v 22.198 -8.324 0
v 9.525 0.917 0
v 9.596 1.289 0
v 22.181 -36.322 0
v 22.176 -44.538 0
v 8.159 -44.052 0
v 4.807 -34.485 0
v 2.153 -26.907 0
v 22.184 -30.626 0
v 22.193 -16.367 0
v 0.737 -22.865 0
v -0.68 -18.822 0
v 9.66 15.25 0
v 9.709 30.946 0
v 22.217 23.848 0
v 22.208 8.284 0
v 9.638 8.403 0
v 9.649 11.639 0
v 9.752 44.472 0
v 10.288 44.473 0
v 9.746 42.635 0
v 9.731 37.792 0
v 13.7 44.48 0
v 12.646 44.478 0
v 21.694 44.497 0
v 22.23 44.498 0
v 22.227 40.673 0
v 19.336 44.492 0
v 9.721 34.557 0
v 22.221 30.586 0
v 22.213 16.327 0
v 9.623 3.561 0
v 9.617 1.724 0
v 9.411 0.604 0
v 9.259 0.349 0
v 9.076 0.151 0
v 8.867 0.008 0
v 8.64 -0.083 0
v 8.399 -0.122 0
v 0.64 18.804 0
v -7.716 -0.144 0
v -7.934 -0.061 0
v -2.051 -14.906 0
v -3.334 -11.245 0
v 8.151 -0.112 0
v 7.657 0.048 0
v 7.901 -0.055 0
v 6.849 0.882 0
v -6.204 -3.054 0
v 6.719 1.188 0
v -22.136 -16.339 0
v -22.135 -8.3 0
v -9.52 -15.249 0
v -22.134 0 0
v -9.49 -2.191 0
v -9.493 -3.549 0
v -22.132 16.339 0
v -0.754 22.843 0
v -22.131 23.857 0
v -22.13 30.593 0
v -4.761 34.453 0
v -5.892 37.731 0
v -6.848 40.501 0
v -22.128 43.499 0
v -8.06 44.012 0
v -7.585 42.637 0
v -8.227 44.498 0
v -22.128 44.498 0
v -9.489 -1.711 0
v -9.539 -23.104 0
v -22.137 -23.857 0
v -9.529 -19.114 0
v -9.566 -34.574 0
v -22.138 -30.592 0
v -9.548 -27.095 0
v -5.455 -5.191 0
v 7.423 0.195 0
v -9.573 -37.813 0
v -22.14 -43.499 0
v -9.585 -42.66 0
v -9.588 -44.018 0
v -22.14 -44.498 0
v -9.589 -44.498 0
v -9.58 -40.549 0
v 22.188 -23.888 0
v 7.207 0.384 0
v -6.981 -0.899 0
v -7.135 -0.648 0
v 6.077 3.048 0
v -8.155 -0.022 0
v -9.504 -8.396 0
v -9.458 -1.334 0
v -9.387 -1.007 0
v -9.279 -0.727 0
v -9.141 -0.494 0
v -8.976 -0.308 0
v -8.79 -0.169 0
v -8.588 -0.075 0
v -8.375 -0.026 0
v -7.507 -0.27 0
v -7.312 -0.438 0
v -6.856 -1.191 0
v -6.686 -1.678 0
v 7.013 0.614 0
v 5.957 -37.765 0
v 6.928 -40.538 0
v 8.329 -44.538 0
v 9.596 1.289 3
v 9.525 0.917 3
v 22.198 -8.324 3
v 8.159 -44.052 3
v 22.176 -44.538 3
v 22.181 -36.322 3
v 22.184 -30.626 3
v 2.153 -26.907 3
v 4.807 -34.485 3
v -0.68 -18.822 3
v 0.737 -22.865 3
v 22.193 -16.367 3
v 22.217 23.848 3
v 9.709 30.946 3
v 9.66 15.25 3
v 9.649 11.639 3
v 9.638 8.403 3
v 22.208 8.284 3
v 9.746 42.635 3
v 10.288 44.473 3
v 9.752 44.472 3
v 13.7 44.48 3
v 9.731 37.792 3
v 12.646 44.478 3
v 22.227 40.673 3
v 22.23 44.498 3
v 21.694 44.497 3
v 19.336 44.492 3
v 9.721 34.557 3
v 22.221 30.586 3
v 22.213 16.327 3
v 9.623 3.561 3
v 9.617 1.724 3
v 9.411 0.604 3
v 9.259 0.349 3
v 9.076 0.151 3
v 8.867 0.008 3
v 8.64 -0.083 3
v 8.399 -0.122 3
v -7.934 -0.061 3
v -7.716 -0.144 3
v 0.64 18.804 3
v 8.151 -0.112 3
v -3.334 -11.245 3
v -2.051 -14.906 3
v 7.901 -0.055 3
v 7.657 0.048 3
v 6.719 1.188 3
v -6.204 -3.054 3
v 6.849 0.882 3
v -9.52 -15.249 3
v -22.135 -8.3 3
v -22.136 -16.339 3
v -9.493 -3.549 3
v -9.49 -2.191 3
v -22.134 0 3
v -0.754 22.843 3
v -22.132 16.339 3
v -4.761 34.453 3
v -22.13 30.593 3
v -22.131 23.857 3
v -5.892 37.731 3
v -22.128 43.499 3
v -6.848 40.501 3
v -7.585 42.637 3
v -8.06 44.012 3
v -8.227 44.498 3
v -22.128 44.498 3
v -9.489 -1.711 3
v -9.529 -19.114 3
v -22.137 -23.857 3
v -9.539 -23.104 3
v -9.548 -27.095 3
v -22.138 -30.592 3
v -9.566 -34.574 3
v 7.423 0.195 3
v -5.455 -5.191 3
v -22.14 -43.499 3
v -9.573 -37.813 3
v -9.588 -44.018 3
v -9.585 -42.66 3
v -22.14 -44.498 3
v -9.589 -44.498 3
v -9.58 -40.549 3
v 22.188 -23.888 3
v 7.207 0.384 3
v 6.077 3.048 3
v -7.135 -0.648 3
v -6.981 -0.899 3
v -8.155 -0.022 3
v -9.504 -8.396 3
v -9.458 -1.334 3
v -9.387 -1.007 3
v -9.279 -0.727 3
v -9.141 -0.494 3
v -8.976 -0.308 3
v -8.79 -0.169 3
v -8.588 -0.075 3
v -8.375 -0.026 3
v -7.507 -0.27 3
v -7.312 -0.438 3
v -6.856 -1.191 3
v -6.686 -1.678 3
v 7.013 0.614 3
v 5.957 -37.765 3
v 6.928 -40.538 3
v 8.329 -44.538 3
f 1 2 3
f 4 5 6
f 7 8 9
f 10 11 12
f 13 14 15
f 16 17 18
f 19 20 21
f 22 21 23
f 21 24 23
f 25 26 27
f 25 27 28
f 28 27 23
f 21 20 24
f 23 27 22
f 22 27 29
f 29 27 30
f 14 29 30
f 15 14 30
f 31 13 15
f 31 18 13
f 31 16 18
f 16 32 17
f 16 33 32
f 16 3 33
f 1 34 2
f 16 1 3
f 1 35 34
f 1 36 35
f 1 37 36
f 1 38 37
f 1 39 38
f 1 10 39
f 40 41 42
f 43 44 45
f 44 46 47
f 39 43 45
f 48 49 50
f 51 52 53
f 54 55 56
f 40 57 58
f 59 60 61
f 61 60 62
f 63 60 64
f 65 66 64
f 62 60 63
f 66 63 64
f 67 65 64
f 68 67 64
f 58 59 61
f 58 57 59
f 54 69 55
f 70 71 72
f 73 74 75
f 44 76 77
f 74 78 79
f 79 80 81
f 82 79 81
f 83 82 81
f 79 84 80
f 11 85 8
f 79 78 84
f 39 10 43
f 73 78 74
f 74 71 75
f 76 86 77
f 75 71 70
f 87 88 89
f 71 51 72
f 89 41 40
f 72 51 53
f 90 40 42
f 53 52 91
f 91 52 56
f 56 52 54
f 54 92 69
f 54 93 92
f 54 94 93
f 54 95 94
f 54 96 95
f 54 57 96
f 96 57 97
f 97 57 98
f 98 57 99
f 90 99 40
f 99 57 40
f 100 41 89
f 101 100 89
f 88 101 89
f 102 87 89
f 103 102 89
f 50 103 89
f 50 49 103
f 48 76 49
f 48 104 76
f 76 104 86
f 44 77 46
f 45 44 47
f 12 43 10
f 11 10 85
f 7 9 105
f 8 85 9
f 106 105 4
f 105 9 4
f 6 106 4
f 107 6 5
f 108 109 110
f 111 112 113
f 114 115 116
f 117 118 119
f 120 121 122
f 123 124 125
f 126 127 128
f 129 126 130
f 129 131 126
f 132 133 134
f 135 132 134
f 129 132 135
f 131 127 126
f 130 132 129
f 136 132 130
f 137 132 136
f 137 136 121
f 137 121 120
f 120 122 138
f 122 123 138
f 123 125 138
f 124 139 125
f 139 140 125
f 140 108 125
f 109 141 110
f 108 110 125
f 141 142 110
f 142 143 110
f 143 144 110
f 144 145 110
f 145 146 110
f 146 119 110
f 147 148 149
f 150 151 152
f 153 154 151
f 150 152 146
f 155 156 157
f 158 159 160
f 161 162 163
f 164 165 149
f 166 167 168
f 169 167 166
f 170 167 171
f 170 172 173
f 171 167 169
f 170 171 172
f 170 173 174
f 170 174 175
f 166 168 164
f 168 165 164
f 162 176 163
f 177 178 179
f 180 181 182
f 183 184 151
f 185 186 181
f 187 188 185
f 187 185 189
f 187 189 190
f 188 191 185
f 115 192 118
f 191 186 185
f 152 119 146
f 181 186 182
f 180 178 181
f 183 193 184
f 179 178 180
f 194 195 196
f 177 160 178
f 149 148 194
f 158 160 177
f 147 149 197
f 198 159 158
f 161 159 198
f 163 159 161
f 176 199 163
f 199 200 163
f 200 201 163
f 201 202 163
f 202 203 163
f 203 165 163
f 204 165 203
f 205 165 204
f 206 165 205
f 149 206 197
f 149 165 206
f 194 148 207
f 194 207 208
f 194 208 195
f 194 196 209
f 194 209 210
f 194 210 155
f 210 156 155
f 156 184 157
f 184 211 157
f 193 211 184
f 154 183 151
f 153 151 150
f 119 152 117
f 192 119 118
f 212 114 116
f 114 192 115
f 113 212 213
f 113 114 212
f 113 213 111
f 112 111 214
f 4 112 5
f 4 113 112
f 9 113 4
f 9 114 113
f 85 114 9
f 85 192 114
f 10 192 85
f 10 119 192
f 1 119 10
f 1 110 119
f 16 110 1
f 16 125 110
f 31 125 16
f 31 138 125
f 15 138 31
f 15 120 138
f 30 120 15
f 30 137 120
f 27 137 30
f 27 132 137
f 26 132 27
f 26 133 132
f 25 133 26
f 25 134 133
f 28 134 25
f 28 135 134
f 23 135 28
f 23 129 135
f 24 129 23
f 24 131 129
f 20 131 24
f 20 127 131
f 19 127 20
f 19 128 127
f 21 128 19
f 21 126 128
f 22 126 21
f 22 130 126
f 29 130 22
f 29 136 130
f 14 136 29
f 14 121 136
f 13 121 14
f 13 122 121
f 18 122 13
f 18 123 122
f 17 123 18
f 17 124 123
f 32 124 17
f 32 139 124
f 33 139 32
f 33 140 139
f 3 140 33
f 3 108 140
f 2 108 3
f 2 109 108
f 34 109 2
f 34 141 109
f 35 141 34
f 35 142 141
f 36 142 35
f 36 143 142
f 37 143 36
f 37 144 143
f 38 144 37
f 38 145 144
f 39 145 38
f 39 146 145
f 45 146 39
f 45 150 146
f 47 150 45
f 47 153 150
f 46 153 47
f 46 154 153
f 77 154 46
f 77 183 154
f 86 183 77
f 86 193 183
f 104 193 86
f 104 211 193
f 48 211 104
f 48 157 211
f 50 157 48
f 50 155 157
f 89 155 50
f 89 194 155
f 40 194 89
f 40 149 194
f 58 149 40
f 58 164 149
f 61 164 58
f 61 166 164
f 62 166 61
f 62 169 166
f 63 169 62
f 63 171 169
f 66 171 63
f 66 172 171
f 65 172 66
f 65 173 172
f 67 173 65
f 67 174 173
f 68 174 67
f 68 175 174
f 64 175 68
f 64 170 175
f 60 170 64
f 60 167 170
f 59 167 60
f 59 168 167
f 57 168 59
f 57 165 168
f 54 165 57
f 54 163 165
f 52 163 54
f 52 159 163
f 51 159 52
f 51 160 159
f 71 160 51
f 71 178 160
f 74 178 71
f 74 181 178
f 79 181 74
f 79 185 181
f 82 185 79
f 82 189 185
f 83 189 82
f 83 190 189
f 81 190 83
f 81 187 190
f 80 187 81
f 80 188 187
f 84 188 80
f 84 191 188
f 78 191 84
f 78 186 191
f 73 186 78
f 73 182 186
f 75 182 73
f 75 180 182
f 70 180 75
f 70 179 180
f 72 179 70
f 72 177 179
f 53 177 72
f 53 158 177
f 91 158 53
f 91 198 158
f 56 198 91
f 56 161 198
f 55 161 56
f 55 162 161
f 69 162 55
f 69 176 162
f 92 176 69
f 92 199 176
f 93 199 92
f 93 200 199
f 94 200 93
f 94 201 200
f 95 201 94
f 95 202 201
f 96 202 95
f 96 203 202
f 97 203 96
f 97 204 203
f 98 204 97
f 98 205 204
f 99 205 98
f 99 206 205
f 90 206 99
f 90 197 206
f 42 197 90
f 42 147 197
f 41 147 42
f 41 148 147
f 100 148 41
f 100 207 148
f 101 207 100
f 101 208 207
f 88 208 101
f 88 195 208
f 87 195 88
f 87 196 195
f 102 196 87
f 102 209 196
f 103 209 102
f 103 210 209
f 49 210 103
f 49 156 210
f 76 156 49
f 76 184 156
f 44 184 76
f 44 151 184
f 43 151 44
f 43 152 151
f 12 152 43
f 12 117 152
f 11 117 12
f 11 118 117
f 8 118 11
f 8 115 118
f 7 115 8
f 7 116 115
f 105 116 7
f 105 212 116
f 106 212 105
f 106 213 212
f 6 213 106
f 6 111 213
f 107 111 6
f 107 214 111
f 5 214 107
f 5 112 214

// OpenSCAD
// Generated from 交通部公路局（原交通部公路總局）「新式號牌使用之英文字、數字字體」author trace
fudge = 0.1;

module glyph_2012_N(h = 3) {
  difference() {
    linear_extrude(height = h)
      polygon(points = [[-22.1278, 44.4984], [-22.1279, 43.4989], [-22.1283, 40.6743], [-22.1289, 36.2853], [-22.1297, 30.5927], [-22.1307, 23.8571], [-22.1317, 16.3393], [-22.1329, 8.3001], [-22.1341, 0.0001], [-22.1352, -8.2998], [-22.1364, -16.3391], [-22.1374, -23.8568], [-22.1384, -30.5924], [-22.1392, -36.2851], [-22.1398, -40.674], [-22.1402, -43.4986], [-22.1404, -44.4981], [-21.9994, -44.4981], [-21.601, -44.4981], [-20.9821, -44.4981], [-20.1792, -44.4981], [-19.2293, -44.4981], [-18.169, -44.4981], [-17.0352, -44.4981], [-15.8646, -44.4981], [-14.6941, -44.4981], [-13.5603, -44.4981], [-12.5, -44.4981], [-11.5501, -44.4981], [-10.7472, -44.4981], [-10.1282, -44.4981], [-9.7299, -44.4981], [-9.5889, -44.4981], [-9.5878, -44.0176], [-9.5846, -42.6596], [-9.5797, -40.5495], [-9.5732, -37.8126], [-9.5657, -34.5743], [-9.5572, -30.9599], [-9.5481, -27.0948], [-9.5388, -23.1044], [-9.5294, -19.114], [-9.5204, -15.2489], [-9.5119, -11.6345], [-9.5043, -8.3962], [-9.4979, -5.6593], [-9.493, -3.5492], [-9.4898, -2.1912], [-9.4887, -1.7107], [-9.4584, -1.3344], [-9.387, -1.0067], [-9.2795, -0.7267], [-9.1409, -0.4942], [-8.9762, -0.3083], [-8.7903, -0.1687], [-8.5881, -0.0748], [-8.3746, -0.0259], [-8.1549, -0.0216], [-7.9337, -0.0612], [-7.7162, -0.1442], [-7.5072, -0.2701], [-7.3118, -0.4383], [-7.1348, -0.6483], [-6.9813, -0.8994], [-6.8562, -1.1911], [-6.6857, -1.678], [-6.2037, -3.0537], [-5.4548, -5.1915], [-4.4834, -7.9642], [-3.3341, -11.2448], [-2.0514, -14.9065], [-0.6796, -18.8222], [0.7366, -22.8648], [2.1529, -26.9075], [3.5246, -30.8231], [4.8074, -34.4848], [5.9567, -37.7654], [6.928, -40.5382], [7.6769, -42.6759], [8.1589, -44.0517], [8.3295, -44.5385], [8.485, -44.5385], [8.9244, -44.5385], [9.6073, -44.5385], [10.493, -44.5385], [11.541, -44.5385], [12.7106, -44.5385], [13.9614, -44.5385], [15.2528, -44.5385], [16.5441, -44.5385], [17.7949, -44.5385], [18.9646, -44.5385], [20.0125, -44.5385], [20.8982, -44.5385], [21.5811, -44.5385], [22.0206, -44.5385], [22.1761, -44.5385], [22.1767, -43.5385], [22.1784, -40.7127], [22.181, -36.3217], [22.1845, -30.6265], [22.1885, -23.8878], [22.1931, -16.3666], [22.1979, -8.3238], [22.2029, -0.02], [22.2079, 8.2837], [22.2128, 16.3266], [22.2173, 23.8478], [22.2214, 30.5864], [22.2248, 36.2816], [22.2274, 40.6726], [22.2292, 43.4985], [22.2298, 44.4984], [22.0896, 44.4981], [21.6936, 44.4972], [21.0782, 44.4959], [20.2801, 44.4942], [19.3357, 44.4922], [18.2816, 44.4899], [17.1544, 44.4875], [15.9907, 44.485], [14.827, 44.4825], [13.6998, 44.4801], [12.6458, 44.4778], [11.7014, 44.4758], [10.9032, 44.4741], [10.2879, 44.4728], [9.8918, 44.4719], [9.7517, 44.4716], [9.7502, 43.9915], [9.7459, 42.6348], [9.7393, 40.5266], [9.7307, 37.7923], [9.7206, 34.557], [9.7092, 30.946], [9.6971, 27.0846], [9.6846, 23.0979], [9.6721, 19.1112], [9.66, 15.2497], [9.6486, 11.6387], [9.6385, 8.4035], [9.6299, 5.6691], [9.6233, 3.561], [9.619, 2.2042], [9.6175, 1.7242], [9.5961, 1.2895], [9.5252, 0.9167], [9.4109, 0.6039], [9.2591, 0.3493], [9.076, 0.1512], [8.8675, 0.0077], [8.6398, -0.0828], [8.3988, -0.1223], [8.1506, -0.1125], [7.9013, -0.0551], [7.6568, 0.048], [7.4233, 0.1951], [7.2067, 0.3844], [7.0132, 0.6141], [6.8487, 0.8824], [6.7194, 1.1875], [6.5515, 1.6739], [6.0771, 3.0485], [5.34, 5.1844], [4.3839, 7.9548], [3.2527, 11.2327], [1.9901, 14.8913], [0.6399, 18.8037], [-0.754, 22.8429], [-2.148, 26.8822], [-3.4982, 30.7946], [-4.7608, 34.4531], [-5.892, 37.7311], [-6.8481, 40.5014], [-7.5852, 42.6374], [-8.0596, 44.012], [-8.2275, 44.4984], [-8.3836, 44.4984], [-8.8247, 44.4984], [-9.5103, 44.4984], [-10.3994, 44.4984], [-11.4514, 44.4984], [-12.6256, 44.4984], [-13.8812, 44.4984], [-15.1776, 44.4984], [-16.474, 44.4984], [-17.7296, 44.4984], [-18.9038, 44.4984], [-19.9558, 44.4984], [-20.845, 44.4984], [-21.5305, 44.4984], [-21.9716, 44.4984]]);
  }
}

glyph_2012_N();
